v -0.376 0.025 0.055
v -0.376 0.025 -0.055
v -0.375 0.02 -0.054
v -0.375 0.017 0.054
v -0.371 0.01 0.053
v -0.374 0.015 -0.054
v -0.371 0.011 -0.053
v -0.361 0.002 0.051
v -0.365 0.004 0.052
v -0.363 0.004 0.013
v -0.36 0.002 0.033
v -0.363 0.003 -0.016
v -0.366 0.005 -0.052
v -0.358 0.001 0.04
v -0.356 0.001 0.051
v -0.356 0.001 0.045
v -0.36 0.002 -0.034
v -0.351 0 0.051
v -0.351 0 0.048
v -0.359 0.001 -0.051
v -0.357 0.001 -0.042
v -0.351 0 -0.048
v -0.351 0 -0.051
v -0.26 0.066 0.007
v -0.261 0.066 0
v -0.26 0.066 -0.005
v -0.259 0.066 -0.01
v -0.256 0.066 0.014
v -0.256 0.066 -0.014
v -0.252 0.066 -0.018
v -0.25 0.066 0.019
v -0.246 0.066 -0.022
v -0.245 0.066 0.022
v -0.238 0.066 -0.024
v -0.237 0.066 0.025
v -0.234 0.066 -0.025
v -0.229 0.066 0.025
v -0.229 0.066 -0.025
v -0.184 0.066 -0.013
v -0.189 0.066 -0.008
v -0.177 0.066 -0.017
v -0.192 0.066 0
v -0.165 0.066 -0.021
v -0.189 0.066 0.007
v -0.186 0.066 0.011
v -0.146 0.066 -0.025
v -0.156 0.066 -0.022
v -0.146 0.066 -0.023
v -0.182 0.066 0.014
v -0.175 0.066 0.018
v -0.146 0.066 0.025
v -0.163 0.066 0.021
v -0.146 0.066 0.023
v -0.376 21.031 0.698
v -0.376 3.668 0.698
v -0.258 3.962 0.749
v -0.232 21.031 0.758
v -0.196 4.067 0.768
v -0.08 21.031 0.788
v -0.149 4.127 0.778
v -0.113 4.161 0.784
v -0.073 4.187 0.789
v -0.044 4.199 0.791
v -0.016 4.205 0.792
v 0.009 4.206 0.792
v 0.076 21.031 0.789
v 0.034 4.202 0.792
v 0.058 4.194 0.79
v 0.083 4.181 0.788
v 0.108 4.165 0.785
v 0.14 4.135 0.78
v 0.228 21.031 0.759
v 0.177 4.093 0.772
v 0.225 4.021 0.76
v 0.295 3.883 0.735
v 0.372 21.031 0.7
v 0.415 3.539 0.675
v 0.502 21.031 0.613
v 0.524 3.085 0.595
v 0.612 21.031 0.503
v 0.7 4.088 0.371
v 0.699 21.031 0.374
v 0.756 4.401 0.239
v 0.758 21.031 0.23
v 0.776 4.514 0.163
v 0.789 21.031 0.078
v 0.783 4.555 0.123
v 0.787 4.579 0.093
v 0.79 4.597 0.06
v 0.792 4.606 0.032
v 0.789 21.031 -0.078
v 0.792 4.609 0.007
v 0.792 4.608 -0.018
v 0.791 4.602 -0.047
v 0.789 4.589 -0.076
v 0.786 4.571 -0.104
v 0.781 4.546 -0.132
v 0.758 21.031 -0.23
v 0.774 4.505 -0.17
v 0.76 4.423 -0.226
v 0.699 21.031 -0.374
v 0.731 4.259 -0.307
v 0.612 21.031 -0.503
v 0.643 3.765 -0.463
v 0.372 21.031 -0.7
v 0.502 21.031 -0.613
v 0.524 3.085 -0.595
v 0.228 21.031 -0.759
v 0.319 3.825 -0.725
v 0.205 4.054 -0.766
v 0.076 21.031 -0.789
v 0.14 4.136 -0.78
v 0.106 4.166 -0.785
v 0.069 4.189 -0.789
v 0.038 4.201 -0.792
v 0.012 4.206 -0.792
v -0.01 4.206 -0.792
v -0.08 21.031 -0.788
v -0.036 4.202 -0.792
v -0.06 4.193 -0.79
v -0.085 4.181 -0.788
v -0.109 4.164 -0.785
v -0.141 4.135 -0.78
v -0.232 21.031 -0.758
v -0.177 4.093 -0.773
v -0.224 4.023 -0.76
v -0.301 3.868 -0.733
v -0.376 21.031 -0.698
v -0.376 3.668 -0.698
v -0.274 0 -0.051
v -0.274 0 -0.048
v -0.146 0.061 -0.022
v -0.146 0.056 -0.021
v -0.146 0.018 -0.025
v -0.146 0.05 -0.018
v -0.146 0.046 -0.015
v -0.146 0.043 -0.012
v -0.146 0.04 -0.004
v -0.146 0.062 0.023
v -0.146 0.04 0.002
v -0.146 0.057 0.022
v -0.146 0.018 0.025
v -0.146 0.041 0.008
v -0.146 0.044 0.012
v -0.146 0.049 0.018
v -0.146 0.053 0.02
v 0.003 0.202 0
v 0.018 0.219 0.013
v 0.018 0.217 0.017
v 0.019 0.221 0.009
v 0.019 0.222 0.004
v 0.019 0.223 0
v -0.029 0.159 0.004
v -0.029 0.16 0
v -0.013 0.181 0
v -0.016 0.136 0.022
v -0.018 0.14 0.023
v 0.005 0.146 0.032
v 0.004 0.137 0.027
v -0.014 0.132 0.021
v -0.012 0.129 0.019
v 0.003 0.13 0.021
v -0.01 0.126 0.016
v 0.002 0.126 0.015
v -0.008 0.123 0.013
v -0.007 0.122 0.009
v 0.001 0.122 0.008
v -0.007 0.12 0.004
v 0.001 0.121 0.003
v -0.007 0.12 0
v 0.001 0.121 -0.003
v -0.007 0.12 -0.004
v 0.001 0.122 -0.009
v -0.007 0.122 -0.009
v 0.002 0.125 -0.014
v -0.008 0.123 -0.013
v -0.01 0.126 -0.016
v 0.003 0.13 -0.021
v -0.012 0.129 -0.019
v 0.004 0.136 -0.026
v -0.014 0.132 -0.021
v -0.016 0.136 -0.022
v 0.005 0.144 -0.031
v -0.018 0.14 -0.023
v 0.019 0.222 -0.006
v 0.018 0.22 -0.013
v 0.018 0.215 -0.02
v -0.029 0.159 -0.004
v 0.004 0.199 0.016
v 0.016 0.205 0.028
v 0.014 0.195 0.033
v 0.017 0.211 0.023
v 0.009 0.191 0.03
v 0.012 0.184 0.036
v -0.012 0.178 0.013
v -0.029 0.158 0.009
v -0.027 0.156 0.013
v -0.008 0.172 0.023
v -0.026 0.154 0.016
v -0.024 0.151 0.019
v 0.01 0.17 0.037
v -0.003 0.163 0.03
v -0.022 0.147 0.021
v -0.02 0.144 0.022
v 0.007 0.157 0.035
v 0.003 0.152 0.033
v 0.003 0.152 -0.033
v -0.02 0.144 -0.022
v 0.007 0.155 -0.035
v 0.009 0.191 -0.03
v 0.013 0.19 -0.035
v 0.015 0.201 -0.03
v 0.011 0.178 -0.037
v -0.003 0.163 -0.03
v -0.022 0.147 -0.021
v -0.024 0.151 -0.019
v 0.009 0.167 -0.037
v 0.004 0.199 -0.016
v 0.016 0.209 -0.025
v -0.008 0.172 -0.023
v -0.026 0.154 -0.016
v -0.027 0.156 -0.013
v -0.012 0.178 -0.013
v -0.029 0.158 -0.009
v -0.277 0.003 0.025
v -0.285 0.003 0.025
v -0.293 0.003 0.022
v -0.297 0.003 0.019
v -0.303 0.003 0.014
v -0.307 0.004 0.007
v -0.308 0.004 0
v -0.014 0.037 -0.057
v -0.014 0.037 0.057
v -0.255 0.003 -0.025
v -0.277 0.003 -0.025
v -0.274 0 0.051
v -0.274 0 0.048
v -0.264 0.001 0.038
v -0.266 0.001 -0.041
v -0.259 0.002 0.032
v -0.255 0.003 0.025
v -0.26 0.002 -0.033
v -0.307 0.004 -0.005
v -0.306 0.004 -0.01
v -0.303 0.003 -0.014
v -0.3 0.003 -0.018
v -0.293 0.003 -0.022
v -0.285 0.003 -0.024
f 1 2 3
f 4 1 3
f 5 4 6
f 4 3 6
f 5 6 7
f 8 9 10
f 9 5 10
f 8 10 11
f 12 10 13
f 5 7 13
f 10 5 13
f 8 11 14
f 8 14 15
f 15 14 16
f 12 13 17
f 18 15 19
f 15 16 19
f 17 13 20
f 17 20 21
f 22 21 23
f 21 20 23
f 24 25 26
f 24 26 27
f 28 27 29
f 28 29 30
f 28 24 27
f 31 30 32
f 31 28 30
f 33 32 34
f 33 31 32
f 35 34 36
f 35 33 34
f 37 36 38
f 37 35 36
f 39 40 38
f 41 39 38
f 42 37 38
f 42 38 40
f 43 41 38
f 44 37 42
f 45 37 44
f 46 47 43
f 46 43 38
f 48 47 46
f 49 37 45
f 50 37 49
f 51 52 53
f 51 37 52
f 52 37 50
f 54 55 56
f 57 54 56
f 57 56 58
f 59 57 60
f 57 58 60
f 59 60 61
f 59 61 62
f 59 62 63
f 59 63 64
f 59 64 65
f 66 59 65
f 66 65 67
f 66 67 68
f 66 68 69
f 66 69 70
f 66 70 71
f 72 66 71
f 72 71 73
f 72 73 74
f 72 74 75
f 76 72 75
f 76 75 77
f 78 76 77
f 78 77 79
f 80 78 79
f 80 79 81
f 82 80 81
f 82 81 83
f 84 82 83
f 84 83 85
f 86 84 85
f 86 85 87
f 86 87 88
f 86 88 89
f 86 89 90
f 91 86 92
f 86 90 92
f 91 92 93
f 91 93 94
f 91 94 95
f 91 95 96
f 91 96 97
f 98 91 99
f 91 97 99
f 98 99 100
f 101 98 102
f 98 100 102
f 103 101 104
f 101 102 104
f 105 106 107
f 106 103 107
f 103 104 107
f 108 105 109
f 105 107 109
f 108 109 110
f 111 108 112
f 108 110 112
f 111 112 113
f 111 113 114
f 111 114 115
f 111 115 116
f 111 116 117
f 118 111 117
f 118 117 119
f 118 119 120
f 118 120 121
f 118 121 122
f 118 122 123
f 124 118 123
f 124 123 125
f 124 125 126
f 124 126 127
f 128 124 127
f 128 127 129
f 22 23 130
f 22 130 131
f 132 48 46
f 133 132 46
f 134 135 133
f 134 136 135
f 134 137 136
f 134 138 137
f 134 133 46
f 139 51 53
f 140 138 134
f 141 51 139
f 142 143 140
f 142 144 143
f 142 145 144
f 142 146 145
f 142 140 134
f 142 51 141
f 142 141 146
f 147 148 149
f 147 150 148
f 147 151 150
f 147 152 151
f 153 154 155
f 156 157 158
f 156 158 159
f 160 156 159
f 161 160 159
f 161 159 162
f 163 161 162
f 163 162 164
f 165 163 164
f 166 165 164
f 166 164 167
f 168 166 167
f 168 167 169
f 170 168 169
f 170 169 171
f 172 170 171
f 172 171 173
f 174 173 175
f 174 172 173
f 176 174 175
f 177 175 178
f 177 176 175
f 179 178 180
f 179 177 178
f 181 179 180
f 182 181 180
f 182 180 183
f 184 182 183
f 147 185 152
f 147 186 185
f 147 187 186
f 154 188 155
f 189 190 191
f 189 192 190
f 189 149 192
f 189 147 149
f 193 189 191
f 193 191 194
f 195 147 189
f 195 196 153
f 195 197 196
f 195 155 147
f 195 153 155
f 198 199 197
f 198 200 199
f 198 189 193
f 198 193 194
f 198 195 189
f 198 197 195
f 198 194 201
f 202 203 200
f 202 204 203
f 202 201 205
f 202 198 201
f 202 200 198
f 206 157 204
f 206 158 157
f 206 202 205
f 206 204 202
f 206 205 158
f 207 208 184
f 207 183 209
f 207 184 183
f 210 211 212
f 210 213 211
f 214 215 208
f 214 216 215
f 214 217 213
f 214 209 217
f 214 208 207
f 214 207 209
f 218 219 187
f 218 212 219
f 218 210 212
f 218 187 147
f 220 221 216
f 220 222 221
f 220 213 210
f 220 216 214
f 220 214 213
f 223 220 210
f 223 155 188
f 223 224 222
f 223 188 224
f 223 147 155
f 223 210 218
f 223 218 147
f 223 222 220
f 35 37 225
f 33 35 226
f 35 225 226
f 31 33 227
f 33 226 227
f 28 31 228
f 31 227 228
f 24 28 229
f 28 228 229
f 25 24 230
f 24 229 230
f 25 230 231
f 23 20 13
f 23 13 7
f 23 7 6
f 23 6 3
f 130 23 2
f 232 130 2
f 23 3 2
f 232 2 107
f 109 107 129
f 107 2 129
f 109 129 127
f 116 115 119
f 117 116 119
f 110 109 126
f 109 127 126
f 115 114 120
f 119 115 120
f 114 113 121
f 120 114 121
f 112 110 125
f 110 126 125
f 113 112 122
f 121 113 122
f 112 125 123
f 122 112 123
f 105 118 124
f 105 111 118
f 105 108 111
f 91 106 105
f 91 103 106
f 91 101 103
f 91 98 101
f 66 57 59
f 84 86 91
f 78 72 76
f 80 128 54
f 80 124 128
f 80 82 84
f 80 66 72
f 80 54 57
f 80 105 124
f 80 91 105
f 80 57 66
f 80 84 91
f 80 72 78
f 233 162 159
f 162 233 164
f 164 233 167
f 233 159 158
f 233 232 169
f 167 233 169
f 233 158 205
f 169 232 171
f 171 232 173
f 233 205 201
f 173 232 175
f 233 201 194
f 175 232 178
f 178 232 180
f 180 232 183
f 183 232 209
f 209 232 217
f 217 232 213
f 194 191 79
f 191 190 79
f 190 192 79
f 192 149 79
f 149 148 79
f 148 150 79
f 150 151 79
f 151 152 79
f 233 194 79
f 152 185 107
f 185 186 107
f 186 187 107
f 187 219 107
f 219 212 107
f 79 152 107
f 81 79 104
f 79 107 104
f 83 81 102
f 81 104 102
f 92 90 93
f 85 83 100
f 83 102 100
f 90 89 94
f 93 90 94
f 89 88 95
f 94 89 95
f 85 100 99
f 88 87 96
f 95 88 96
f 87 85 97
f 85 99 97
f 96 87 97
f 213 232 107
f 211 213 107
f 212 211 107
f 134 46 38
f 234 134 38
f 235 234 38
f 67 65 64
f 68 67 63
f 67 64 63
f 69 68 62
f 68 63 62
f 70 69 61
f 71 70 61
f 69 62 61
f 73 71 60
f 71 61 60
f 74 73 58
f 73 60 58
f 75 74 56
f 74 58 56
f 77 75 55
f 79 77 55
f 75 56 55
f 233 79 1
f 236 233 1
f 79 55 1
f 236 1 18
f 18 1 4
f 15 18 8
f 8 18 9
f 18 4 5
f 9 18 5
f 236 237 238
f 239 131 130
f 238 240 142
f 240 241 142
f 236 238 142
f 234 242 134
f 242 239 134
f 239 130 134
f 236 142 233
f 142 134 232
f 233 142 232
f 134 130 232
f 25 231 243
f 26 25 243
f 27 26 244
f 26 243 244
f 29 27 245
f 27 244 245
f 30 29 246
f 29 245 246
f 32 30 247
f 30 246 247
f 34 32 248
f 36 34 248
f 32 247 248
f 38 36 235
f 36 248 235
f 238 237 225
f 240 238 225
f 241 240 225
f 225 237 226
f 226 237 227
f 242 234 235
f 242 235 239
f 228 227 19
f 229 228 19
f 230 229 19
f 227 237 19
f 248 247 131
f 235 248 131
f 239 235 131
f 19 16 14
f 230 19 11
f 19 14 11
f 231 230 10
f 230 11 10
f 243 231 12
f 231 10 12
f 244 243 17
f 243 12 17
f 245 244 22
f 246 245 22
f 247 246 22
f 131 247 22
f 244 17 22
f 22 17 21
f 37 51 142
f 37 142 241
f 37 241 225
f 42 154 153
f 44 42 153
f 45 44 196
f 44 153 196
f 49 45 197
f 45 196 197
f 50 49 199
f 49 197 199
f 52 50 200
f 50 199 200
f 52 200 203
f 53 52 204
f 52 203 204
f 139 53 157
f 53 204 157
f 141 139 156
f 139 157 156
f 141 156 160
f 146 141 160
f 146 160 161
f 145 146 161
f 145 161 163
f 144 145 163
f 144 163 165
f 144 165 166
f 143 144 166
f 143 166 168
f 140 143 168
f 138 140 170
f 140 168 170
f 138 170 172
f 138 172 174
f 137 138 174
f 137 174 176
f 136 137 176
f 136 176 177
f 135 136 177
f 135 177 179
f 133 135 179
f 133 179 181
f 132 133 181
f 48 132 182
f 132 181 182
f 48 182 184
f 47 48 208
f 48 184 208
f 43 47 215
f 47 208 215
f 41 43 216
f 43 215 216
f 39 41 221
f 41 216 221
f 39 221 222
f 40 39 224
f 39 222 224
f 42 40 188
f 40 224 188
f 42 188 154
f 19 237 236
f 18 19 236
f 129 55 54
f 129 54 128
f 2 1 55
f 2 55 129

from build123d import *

# Parameters (mm, degrees)
TD_SKETCH_R                             = 0.79248
TL_FEATURE_DEPTH                        = 21.0312
TDF_STD_SKETCH_W                        = 2.09296
TDF_STD_SKETCH_H                        = 2.09296
TDF_STD_FEATURE_DEPTH                   = 22.061040395
ISA_20_STD_FEATURE_DEPTH                = 22.061040395
ISA_20_STD_FEATURE_DEPTH_BACK           = 22.061040395
F_10BA_STD_FEATURE_DEPTH                = 22.061040395
F_10BA_STD_FEATURE_DEPTH_BACK           = 22.061040395
FRO_STD_FEATURE_DEPTH                   = 22.061040395
FRO_STD_FEATURE_DEPTH_BACK              = 22.061040395
C_STD_FEATURE_DEPTH                     = 22.061040395
C_STD_FEATURE_DEPTH_BACK                = 22.061040395
ERW_STD_FEATURE_DEPTH                   = 0.0254
H_STD_FEATURE_REACH                     = 22.922
H_STD_SKETCH_R                          = 0.02286
H_STD_SKETCH_3_R                        = 0.02286
FUNNEL_FINAL_DIAMETRE_STD_FEATURE_DEPTH = 2.499995
FUNNEL_FINAL_DIAMETRE_STD_FEATURE_DRAFT = -22.5
ROUND_BR_STD_FEATURE_START              = -1
ROUND_BR_STD_FEATURE_DEPTH              = 0.96499722


with BuildPart() as part:
    # TD_sketch → TL_feature (new body)
    with BuildSketch(Plane(origin=(0, 0, 0), x_dir=(1, 0, 0), z_dir=(0, 1, 0))):
        with Locations(Location((0, 0, 0), (0, 0, 270))):
            Circle(TD_SKETCH_R)
    extrude(amount=TL_FEATURE_DEPTH)

    # TDF_STD_sketch → TDF_STD_feature (cut, through all)
    with BuildSketch(Plane(origin=(0, 0, 0), x_dir=(1, 0, 0), z_dir=(0, 1, 0))):
        with Locations((-1.4224, 0)):
            Rectangle(TDF_STD_SKETCH_W, TDF_STD_SKETCH_H)
    extrude(amount=TDF_STD_FEATURE_DEPTH, mode=Mode.SUBTRACT)

    # ISA_20_STD_sketch → ISA_20_STD_feature (cut, two sides: drawn at the far end of the back side and taken through both)
    with BuildSketch(Plane(origin=(0, 0, 0), x_dir=(0, 0, -1), z_dir=(1, 0, 0)).offset(-ISA_20_STD_FEATURE_DEPTH_BACK)):
        Polygon((-12.968809457, 73.261672178), (-3.759167997, 21.0312), (-0.0508, 0), (0.0508, 0), (3.759167997, 21.0312), (12.968809457, 73.261672178), (12.968809457, -32.810750623), (-12.968809457, -32.810750623), align=None)
    extrude(amount=ISA_20_STD_FEATURE_DEPTH + ISA_20_STD_FEATURE_DEPTH_BACK, mode=Mode.SUBTRACT)

    # 10BA_STD_sketch → 10BA_STD_feature (cut, two sides: drawn at the far end of the back side and taken through both)
    with BuildSketch(Plane.XY.offset(-F_10BA_STD_FEATURE_DEPTH_BACK)):
        Polygon((-53.216424634, 0), (-0.37592, 0), (-0.27432, 0), (-0.013865644, 0.036604473), (3.688047997, 21.0312), (12.863705333, 73.068938636), (91.245889802, 2.18375769), (25.165759835, -70.885180946), align=None)
    extrude(amount=F_10BA_STD_FEATURE_DEPTH + F_10BA_STD_FEATURE_DEPTH_BACK, mode=Mode.SUBTRACT)

    # FRO_STD_sketch → FRO_STD_feature (cut, two sides: drawn at the far end of the back side and taken through both)
    with BuildSketch(Plane.XY.offset(-FRO_STD_FEATURE_DEPTH_BACK)):
        with BuildLine():
            Line((-0.37592, 52.149873762), (-0.37592, 0.0254))
            ThreePointArc((-0.37592, 0.0254), (-0.368480512, 0.007439488), (-0.35052, 0))
            Line((-0.35052, 0), (51.773953762, 0))
            Line((51.773953762, 0), (-21.941183964, -73.715137726))
            Line((-21.941183964, -73.715137726), (-74.091057726, -21.565263964))
            Line((-74.091057726, -21.565263964), (-0.37592, 52.149873762))
        make_face()
    extrude(amount=FRO_STD_FEATURE_DEPTH + FRO_STD_FEATURE_DEPTH_BACK, mode=Mode.SUBTRACT)

    # C_STD_sketch → C_STD_feature (cut, two sides: drawn at the far end of the back side and taken through both)
    with BuildSketch(Plane(origin=(0, 0, 0), x_dir=(0, 0, -1), z_dir=(1, 0, 0)).offset(-C_STD_FEATURE_DEPTH_BACK)):
        with BuildLine():
            Line((-51.498419713, -8.177529753), (-0.048243287, 0))
            ThreePointArc((-0.048243287, 0), (0, 0.00381), (0.048243287, 0))
            Line((0.048243287, 0), (51.498419713, -8.177529753))
            Line((51.498419713, -8.177529753), (51.498419713, -112.369518834))
            Line((51.498419713, -112.369518834), (-51.498419713, -112.369518834))
            Line((-51.498419713, -112.369518834), (-51.498419713, -8.177529753))
        make_face()
    extrude(amount=C_STD_FEATURE_DEPTH + C_STD_FEATURE_DEPTH_BACK, mode=Mode.SUBTRACT)


with BuildPart() as body_2:
    # ERW_STD_sketch → ERW_STD_feature (new, symmetric)
    with BuildSketch(Plane.XY):
        Polygon((-0.145800064, 0.06604), (-0.145800064, 0), (-0.310900064, 0), (-0.261135355, 0.06604), align=None)
    extrude(amount=ERW_STD_FEATURE_DEPTH, both=True)

    # H_STD_sketch → H_STD_feature (add, up to next)
    with BuildSketch(Plane(origin=(-0.017961309, 0.13984774, 0), x_dir=(0, 0, -1), z_dir=(0.8660254037844415, 0.4999999999999953, 0)), mode=Mode.PRIVATE) as h_std_feature_sk1:
        with Locations(Location((0, 0, 0), (0, 0, 90))):
            Circle(H_STD_SKETCH_R)
    h_std_feature_tool1 = extrude(h_std_feature_sk1.sketch, amount=-H_STD_FEATURE_REACH, mode=Mode.PRIVATE) - body_2.part
    add(h_std_feature_tool1.solids().sort_by_distance((-0.017961, 0.139848, 0))[0])


with BuildPart() as funnel_final_diametre_std_feature_tool:
    # H_STD_sketch<3> → funnel_final_diametre_STD_feature (with draft: the straight prism first)
    with BuildSketch(Plane(origin=(-0.017961309, 0.13984774, 0), x_dir=(0, 0, -1), z_dir=(0.8660254037844415, 0.4999999999999953, 0))):
        with Locations(Location((0, 0, 0), (0, 0, 90))):
            Circle(H_STD_SKETCH_3_R)
    extrude(amount=FUNNEL_FINAL_DIAMETRE_STD_FEATURE_DEPTH)
    # funnel_final_diametre_STD_feature: the draft: its side faces are tilted about the plane it starts from
    funnel_final_diametre_std_feature_sides = [funnel_final_diametre_std_feature_tool.faces().sort_by_distance(p)[0] for p in [
        (1.075998281, 0.745049149, 0),
    ]]
    draft(funnel_final_diametre_std_feature_sides, Plane(origin=(-0.017961309, 0.13984774, 0), x_dir=(0, 0, -1), z_dir=(0.8660254037844415, 0.4999999999999953, 0)), FUNNEL_FINAL_DIAMETRE_STD_FEATURE_DRAFT)


with BuildPart() as body_2_1:
    add(body_2.part)

    # funnel_final_diametre_STD_feature: add funnel_final_diametre_std_feature_tool
    add(funnel_final_diametre_std_feature_tool.part)

    # ROUND_BR_STD_feature: read off the stored shape, not the designer's step
    # ROUND_BR_STD_feature outline → ROUND_BR_STD_feature (cut)
    with BuildSketch(Plane(origin=(0, 0, 0), x_dir=(0.79863551004729, -0.601815023152052, 0), z_dir=(0.601815023152052, 0.79863551004729, 0)).offset(ROUND_BR_STD_FEATURE_START)):
        with BuildLine():
            Line((-0.248295831, -0.0254), (-0.222895831, -0.0254))
            ThreePointArc((-0.222895831, -0.0254), (-0.240856343, -0.017960512), (-0.248295831, 0))
            Line((-0.248295831, 0), (-0.248295831, -0.0254))
        make_face()
        with BuildLine():
            Line((-0.248295831, 0.0254), (-0.248295831, 0))
            ThreePointArc((-0.248295831, 0), (-0.240856343, 0.017960512), (-0.222895831, 0.0254))
            Line((-0.222895831, 0.0254), (-0.248295831, 0.0254))
        make_face()
    extrude(amount=ROUND_BR_STD_FEATURE_DEPTH, mode=Mode.SUBTRACT)


with BuildPart() as part_1:
    add(part.part)

    # COMBINE_STD_feature: cut body 2
    add(body_2_1.part, mode=Mode.SUBTRACT)


solid = part_1.part
